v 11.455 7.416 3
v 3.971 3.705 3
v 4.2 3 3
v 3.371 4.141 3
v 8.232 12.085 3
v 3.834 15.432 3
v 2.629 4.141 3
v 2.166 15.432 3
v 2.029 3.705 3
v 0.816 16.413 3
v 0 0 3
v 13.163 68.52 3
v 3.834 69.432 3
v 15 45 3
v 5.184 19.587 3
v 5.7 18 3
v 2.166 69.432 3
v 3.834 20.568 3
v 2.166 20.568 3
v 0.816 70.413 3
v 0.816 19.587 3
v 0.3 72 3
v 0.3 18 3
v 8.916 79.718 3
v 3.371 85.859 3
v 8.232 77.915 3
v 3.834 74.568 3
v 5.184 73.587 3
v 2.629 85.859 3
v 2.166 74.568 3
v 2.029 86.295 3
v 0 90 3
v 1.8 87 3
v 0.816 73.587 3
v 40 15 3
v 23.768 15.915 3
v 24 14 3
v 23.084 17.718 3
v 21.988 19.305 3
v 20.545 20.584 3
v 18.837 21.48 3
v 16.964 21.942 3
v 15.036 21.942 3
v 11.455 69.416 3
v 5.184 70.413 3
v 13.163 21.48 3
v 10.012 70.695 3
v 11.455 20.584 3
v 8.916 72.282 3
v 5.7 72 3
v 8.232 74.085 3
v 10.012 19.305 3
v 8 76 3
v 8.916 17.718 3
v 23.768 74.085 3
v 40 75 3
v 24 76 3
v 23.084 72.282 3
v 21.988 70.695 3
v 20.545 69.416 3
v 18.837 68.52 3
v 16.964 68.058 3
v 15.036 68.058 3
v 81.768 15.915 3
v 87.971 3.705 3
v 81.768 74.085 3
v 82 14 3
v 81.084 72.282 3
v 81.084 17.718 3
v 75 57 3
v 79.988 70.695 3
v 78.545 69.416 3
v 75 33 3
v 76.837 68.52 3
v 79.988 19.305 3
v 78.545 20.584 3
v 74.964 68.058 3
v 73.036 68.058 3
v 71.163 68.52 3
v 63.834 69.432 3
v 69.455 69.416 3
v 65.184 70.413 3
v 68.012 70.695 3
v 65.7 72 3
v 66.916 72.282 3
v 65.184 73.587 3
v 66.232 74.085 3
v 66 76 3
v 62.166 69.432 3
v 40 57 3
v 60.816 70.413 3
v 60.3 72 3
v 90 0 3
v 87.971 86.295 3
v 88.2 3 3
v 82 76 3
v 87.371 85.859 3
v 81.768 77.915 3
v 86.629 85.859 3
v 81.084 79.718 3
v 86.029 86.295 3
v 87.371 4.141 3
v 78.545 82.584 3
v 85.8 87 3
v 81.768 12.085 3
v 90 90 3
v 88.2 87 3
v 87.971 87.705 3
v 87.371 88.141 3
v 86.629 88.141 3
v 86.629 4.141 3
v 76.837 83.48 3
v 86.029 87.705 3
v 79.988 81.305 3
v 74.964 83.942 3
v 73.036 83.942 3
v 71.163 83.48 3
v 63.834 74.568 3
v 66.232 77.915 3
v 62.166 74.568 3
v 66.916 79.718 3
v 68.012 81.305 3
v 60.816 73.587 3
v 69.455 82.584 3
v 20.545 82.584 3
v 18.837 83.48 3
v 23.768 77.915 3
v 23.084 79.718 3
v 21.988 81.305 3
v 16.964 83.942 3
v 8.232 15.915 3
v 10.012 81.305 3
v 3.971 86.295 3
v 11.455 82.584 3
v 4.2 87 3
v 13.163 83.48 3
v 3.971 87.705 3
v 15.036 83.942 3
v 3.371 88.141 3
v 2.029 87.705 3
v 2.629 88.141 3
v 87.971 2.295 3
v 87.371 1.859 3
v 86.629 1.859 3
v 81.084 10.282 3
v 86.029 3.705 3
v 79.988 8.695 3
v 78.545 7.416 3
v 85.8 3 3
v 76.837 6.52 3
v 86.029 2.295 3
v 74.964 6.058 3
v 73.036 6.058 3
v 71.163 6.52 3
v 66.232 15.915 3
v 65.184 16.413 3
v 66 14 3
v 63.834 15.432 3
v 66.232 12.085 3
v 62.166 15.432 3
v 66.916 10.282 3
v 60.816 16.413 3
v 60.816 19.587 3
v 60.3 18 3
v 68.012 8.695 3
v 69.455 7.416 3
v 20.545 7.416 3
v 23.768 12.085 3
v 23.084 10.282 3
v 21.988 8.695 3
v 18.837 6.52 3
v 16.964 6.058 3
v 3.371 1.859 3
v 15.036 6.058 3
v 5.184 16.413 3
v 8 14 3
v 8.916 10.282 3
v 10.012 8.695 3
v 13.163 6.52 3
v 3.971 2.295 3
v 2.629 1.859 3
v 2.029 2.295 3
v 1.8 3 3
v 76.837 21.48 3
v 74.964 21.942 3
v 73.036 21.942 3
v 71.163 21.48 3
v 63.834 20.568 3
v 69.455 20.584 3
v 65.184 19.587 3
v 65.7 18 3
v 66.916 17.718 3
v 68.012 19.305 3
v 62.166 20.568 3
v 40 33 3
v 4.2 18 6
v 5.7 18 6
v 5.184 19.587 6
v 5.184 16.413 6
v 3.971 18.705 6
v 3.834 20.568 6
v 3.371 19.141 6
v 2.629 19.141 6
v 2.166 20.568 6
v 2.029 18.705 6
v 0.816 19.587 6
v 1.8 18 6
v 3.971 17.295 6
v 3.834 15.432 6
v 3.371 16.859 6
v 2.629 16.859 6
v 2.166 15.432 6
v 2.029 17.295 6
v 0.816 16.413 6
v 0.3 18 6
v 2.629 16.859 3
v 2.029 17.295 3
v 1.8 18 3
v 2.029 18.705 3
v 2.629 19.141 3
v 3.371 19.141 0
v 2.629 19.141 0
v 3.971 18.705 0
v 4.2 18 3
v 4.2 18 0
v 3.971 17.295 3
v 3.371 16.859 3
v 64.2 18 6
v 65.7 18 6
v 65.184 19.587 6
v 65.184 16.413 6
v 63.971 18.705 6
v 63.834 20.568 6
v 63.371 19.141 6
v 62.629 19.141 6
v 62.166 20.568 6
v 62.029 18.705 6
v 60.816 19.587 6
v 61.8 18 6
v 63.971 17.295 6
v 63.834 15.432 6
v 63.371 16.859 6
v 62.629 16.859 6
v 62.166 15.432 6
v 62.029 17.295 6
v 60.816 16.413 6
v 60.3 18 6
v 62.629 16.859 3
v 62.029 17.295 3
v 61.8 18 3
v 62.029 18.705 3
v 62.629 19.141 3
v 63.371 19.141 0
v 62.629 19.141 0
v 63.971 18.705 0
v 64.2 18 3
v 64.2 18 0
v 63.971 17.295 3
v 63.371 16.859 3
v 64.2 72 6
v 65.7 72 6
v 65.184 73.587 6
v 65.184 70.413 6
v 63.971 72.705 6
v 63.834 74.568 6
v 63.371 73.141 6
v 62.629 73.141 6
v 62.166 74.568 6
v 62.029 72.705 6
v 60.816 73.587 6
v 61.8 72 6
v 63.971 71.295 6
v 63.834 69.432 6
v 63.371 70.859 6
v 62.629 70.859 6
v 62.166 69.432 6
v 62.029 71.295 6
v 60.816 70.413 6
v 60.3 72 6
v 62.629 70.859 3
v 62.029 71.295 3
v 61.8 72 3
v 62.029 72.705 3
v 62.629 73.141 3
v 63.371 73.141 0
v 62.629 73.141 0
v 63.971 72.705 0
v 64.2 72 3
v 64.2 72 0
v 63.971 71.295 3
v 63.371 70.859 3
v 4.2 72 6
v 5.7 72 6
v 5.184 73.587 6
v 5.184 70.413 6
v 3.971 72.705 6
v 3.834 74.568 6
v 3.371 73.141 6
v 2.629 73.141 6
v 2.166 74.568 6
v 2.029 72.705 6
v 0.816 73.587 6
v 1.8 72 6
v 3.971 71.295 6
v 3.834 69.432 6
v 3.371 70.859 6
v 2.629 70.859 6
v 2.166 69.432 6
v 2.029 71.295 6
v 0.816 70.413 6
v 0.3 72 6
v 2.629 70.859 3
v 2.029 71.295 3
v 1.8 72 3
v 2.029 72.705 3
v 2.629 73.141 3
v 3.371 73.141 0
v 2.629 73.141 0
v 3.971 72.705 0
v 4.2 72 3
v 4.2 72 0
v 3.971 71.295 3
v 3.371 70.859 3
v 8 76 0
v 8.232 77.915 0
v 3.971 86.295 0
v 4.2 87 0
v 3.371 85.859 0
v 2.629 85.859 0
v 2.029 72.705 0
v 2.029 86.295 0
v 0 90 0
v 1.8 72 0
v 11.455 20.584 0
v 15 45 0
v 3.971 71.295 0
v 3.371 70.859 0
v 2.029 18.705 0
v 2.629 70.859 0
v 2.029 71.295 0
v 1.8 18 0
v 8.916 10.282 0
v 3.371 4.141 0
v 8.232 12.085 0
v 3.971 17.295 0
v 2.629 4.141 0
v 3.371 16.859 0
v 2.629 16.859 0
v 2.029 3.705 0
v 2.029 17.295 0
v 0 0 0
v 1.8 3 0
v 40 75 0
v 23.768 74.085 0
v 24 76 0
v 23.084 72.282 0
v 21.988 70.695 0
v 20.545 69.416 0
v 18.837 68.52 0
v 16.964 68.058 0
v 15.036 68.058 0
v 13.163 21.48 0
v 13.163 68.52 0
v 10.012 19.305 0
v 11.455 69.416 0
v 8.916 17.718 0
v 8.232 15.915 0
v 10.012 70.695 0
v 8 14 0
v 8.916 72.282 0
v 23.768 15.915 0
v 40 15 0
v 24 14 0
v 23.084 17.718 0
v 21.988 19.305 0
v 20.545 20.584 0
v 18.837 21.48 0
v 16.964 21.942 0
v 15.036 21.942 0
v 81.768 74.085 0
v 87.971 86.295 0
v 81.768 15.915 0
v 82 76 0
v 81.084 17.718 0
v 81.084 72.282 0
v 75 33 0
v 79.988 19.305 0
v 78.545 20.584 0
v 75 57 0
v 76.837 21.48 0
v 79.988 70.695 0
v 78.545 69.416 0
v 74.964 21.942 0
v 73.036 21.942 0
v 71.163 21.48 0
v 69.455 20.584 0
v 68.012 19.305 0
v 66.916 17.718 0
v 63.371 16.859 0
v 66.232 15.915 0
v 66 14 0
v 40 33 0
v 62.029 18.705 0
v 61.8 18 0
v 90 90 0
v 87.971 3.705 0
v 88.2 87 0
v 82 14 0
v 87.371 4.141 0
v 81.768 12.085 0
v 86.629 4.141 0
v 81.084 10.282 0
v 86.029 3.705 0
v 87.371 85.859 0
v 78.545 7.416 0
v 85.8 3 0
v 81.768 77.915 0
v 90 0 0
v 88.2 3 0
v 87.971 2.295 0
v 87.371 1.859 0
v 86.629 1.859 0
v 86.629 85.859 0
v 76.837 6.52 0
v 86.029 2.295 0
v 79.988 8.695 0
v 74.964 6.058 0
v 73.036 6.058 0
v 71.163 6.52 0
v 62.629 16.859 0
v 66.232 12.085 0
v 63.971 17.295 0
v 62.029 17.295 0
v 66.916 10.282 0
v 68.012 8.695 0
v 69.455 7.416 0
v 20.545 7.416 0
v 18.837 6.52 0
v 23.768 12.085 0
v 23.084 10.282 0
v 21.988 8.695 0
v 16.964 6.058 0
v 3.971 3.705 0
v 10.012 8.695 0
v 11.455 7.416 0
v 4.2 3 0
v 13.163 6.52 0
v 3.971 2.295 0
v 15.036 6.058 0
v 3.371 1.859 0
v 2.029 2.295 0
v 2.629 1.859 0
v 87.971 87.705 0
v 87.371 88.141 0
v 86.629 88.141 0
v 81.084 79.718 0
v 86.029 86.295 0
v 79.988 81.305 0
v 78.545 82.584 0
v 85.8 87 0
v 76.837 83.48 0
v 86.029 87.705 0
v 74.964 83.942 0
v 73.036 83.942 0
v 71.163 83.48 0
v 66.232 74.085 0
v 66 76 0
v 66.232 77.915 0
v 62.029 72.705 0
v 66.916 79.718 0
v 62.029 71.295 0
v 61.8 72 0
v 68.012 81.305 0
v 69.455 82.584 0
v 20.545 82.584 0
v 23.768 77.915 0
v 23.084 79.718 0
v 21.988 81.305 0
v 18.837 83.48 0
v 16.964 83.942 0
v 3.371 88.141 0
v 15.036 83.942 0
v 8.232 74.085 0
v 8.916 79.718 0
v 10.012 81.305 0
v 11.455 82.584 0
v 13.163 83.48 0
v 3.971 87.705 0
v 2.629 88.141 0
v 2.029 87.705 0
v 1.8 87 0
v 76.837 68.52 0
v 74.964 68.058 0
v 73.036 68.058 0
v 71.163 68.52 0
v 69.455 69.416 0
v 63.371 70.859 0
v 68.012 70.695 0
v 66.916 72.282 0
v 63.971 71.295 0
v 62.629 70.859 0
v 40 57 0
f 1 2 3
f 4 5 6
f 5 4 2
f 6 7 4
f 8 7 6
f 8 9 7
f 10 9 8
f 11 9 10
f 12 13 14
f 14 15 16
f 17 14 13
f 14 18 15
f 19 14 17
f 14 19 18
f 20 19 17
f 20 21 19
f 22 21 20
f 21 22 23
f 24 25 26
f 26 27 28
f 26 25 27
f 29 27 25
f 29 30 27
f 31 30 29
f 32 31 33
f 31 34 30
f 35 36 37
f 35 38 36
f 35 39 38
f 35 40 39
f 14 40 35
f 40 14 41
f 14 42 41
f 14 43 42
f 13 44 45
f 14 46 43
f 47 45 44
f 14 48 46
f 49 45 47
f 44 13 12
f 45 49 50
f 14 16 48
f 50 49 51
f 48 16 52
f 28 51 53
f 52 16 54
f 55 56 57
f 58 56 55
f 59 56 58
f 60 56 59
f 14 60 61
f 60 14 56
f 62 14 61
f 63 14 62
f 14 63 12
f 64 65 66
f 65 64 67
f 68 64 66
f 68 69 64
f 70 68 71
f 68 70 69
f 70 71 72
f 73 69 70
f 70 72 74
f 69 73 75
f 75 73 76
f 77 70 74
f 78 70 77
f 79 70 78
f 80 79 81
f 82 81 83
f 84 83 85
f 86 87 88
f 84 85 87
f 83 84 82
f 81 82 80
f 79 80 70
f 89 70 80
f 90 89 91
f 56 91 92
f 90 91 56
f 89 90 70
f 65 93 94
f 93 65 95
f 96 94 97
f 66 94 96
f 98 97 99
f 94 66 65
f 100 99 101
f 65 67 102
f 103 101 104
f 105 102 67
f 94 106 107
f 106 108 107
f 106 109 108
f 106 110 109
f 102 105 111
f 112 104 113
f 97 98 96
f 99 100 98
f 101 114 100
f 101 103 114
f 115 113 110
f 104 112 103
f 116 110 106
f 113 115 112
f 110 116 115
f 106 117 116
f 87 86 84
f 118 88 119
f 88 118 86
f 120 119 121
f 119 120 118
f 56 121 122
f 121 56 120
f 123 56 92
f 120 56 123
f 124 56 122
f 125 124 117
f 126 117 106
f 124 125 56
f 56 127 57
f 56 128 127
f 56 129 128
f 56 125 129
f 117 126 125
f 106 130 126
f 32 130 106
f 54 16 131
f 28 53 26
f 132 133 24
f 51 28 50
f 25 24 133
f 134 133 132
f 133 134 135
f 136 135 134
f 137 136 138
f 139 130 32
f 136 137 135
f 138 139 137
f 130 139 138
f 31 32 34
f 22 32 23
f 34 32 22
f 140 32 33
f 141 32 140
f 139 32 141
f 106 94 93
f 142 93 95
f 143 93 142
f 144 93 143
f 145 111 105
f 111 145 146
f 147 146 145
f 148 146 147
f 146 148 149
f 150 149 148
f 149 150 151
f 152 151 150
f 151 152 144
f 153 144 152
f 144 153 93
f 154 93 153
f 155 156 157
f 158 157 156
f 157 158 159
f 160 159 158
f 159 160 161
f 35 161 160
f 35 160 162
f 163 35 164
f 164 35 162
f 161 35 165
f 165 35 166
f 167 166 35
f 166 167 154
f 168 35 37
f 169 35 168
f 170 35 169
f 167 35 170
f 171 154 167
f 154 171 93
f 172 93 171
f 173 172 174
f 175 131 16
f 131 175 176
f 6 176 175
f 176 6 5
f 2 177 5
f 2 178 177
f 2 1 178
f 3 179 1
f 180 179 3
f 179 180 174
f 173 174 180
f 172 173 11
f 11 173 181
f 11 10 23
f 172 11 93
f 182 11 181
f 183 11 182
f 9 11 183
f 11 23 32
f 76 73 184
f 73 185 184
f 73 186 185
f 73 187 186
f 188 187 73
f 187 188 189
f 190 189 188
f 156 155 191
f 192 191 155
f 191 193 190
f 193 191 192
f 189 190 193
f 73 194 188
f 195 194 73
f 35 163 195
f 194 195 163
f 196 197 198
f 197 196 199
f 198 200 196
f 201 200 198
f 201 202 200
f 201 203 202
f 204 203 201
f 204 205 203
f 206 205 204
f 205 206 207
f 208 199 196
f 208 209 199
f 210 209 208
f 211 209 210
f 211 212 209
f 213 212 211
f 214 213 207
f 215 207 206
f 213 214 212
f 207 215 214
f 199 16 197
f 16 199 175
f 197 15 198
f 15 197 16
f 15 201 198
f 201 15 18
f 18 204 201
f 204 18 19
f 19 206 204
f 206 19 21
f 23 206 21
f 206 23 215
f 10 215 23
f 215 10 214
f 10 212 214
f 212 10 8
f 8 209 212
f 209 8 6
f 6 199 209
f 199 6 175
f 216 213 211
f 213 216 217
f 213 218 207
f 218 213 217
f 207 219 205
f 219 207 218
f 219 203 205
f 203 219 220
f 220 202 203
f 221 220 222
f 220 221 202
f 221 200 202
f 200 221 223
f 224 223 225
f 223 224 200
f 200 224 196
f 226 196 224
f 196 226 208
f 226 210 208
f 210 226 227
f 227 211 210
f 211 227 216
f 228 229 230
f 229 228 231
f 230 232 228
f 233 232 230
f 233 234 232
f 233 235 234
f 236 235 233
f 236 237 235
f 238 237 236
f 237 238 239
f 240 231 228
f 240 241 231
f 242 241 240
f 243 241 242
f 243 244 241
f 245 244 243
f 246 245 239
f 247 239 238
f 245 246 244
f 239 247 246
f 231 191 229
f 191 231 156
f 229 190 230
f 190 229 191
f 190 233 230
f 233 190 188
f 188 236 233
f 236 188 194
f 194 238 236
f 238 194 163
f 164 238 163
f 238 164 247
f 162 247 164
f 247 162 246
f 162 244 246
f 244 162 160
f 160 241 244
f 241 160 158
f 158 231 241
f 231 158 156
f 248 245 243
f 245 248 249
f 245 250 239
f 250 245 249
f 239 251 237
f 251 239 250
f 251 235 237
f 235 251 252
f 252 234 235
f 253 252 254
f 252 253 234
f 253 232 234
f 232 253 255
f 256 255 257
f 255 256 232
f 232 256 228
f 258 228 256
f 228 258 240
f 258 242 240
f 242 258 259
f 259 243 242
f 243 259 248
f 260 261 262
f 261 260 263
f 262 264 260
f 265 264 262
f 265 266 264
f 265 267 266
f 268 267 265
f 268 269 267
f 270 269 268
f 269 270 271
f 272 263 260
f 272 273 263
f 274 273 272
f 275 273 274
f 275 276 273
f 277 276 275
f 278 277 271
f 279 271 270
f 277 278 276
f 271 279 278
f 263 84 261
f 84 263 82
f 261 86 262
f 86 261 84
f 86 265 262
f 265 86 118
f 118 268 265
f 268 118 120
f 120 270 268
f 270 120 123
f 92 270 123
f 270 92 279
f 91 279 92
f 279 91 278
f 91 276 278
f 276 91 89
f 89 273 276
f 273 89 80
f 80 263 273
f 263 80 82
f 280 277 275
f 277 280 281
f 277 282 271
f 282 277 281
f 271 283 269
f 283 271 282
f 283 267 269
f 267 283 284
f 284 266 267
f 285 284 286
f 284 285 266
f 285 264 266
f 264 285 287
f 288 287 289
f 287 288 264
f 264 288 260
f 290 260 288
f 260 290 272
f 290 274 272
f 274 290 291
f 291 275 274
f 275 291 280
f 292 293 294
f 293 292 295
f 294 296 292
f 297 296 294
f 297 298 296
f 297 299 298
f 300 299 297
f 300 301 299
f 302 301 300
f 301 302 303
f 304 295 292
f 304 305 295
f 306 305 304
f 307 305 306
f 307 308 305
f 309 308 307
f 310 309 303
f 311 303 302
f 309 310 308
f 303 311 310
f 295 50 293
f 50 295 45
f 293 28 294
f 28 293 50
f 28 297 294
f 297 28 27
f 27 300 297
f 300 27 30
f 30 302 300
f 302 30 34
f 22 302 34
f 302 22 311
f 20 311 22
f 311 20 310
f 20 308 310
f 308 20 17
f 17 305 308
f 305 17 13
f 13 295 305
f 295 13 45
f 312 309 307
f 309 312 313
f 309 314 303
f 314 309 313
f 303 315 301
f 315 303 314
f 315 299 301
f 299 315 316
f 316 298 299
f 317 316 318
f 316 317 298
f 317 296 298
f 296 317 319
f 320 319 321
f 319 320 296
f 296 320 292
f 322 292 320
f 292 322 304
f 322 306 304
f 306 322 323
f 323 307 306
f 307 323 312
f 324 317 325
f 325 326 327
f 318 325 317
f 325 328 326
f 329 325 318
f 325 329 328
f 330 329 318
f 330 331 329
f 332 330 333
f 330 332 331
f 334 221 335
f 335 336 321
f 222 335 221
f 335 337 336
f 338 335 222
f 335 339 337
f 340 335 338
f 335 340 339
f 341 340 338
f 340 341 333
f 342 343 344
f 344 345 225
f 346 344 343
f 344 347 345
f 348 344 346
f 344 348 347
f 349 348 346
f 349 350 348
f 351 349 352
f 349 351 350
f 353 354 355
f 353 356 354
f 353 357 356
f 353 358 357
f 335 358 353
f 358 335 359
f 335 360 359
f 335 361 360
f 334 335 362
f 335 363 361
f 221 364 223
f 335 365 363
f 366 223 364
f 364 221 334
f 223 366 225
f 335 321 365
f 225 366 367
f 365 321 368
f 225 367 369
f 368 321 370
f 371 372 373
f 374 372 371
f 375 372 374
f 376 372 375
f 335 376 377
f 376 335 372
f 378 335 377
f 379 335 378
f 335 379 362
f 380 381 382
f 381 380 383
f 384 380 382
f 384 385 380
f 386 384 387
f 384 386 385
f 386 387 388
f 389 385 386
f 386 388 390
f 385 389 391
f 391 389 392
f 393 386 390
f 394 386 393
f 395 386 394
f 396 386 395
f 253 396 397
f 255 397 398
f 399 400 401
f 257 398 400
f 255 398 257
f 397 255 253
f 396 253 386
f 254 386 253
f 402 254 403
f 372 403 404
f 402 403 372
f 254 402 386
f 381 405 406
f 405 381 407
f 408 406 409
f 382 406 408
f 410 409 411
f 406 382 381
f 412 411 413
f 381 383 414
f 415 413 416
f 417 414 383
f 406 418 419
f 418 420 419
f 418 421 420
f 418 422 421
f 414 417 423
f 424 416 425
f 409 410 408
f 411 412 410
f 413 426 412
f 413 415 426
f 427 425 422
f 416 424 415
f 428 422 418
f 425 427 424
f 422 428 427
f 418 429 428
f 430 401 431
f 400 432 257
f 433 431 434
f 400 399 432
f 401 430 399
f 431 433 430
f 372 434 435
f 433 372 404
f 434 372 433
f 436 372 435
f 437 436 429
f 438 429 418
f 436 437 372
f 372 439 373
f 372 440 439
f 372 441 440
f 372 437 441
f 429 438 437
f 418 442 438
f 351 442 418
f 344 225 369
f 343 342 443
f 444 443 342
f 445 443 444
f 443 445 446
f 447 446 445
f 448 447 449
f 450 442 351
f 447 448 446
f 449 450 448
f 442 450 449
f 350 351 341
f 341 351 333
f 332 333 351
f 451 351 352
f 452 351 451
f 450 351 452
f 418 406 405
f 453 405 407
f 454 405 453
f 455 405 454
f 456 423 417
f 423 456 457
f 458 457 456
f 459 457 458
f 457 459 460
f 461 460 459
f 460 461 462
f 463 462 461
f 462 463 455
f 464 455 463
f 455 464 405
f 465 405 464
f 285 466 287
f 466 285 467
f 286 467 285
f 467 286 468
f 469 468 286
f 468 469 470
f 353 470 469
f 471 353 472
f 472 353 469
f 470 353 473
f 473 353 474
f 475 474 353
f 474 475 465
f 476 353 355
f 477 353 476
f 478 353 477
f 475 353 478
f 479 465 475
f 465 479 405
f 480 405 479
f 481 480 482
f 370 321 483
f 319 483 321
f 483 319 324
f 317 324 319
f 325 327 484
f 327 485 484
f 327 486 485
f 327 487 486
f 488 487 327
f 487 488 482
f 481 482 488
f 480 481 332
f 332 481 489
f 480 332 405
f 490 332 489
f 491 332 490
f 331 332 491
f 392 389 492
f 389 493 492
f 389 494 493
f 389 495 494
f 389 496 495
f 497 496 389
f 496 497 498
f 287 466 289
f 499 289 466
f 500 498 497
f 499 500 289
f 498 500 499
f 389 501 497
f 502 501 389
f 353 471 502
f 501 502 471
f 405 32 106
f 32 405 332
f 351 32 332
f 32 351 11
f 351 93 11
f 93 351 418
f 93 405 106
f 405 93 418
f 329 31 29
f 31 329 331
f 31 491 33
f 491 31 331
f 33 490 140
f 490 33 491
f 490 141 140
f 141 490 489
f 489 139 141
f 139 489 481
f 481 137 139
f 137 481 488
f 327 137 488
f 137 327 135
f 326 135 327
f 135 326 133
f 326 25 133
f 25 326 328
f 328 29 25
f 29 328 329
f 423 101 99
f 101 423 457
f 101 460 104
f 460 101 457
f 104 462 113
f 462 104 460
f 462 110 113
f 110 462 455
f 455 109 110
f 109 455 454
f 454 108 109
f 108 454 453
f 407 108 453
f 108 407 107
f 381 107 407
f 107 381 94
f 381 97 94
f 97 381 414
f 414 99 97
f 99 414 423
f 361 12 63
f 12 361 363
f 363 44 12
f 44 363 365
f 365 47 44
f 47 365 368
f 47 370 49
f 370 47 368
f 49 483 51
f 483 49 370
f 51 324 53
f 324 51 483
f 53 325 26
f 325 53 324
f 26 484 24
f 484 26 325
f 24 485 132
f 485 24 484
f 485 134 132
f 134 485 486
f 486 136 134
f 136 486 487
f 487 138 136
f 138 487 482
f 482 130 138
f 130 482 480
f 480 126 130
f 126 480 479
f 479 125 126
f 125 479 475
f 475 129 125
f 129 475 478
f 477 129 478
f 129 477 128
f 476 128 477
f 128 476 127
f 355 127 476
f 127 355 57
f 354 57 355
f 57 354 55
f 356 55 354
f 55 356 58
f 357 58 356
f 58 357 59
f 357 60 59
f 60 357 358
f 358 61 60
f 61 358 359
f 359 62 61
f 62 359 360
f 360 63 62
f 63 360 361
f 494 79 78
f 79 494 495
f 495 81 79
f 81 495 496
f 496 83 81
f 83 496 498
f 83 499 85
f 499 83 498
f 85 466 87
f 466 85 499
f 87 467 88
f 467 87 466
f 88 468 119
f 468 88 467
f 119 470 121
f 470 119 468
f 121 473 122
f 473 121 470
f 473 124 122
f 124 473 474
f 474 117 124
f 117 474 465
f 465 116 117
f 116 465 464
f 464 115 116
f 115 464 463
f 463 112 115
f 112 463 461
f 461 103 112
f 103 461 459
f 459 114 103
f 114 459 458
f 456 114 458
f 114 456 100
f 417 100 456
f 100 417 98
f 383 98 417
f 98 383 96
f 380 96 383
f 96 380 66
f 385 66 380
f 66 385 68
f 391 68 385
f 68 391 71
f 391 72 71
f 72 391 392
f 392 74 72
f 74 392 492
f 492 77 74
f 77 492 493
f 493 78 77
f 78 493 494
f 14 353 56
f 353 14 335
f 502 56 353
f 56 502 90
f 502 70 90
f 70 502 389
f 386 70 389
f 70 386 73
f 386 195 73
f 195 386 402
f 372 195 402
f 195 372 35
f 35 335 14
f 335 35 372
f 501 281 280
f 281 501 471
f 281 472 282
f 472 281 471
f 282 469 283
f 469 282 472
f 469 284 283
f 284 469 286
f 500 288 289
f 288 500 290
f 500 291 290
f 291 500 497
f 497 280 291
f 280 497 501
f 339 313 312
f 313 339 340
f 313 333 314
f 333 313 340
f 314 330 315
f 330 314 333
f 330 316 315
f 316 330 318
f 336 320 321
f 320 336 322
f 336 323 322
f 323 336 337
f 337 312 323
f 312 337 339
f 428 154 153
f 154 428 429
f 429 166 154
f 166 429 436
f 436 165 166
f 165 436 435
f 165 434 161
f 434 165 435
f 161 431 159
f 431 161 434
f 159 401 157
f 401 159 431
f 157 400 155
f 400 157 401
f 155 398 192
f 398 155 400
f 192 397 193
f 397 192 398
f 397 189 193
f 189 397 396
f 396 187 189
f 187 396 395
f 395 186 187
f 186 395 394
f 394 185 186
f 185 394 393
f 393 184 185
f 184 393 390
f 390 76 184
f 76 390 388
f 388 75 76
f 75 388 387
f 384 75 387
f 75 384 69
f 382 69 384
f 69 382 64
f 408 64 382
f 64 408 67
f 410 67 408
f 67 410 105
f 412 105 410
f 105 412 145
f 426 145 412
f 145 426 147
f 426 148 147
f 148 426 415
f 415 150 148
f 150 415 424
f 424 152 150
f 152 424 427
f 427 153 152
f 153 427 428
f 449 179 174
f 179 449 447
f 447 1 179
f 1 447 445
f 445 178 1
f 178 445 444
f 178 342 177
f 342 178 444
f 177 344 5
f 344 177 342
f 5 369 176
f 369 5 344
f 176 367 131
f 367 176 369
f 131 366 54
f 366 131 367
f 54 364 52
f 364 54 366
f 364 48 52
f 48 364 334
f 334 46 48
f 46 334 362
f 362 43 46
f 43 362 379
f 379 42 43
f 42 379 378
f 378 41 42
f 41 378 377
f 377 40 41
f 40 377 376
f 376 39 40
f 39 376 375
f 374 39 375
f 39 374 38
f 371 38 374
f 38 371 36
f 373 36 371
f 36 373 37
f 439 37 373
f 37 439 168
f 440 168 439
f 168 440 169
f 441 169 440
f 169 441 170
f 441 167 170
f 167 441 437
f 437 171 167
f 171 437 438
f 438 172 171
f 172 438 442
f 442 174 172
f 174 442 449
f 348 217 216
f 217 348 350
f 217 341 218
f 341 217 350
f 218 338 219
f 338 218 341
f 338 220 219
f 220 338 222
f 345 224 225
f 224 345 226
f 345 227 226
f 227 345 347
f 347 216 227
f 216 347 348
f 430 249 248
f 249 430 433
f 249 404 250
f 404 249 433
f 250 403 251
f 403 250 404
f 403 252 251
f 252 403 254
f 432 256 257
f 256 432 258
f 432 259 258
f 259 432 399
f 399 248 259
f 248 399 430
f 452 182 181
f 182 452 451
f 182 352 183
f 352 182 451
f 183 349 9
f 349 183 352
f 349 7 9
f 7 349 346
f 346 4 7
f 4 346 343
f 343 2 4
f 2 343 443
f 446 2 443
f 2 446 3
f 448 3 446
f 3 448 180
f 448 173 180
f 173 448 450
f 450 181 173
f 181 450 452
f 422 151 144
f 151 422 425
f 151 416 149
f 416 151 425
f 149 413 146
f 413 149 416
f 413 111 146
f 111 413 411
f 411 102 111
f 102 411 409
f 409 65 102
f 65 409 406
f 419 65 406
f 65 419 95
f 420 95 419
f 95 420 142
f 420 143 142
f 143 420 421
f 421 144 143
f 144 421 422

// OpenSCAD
use <../../Writescad/Write.scad>

////////////////////////
// HOLES

/* This board is to be used for a Raspberry Pi 3. The base#1
 * produced a warped board, and future prints should use a
 * heated glass plate.
 */

module screw_hole(x, y, hole_r)
{
    translate([x,y,0])
        circle(hole_r, $fn=10);
}

module screw_buffer(x, y, z, hole_r)
{
    outer_r = hole_r + 1.5;
    height = 3;
    translate([x, y, z])
        linear_extrude(0, 0, height)
            difference()
            {
                circle(outer_r, $fn=10);
                circle(hole_r, $fn=10);
            }
}

module all_screw_holes(hole_r)
{
    //Pi Board holes
    screw_hole(3, 18, hole_r);
    screw_hole(63, 18, hole_r);
    screw_hole(63, 72, hole_r);
    screw_hole(3, 72, hole_r);
    //leg holes
    screw_hole(3, 3, hole_r);
    screw_hole(3, 87, hole_r);
    screw_hole(87, 87, hole_r);
    screw_hole(87, 3, hole_r);
}
// Note - lots of duplication between these two, try and clean this up module
module all_screw_buffers(z, hole_r)
{
    //Pi Board buffers
    screw_buffer(3, 18, z, hole_r);
    screw_buffer(63, 18, z, hole_r);
    screw_buffer(63, 72, z, hole_r);
    screw_buffer(3, 72, z, hole_r);
}

module wire_holes(base_width)
{
    translate([16, base_width-14, 0])
        circle(r=8);
    translate([base_width-16, base_width-14, 0])
        circle(r=8);
    translate([base_width-16, 14, 0])
        circle(r=8);
    translate([16, 14, 0])
        circle(r=8);
}

////////////////////////
// BASE

module arrow()
{
    triangle_shape = [
        [0, 0],
        [25, 30],
        [25, 12],
        [60, 12],
        [60, 0]
    ];
    mirror([0, 90])
        polygon(points=triangle_shape);
    polygon(points=triangle_shape);
}

module base(base_width, base_thickness, arrow_pos)
{
    difference()
    {
        difference()
        {
            square(base_width);
            translate(arrow_pos)
                arrow(arrow_pos);
        }
        wire_holes(base_width);
    }
}

module text(base_width, z)
{
    translate([5, base_width-9, z])
        write("0");
    translate([base_width-8, base_width-9, z])
        write("1");
    translate([base_width-8, 5, z])
        write("2");
    translate([5, 5, z])
        write("3");
}

////////////////////////
// GLOBALS

base_thickness = 3;
base_width = 90;
arrow_pos = [15, 45];
hole_r = 1.2;

////////////////////////
// RENDERS

all_screw_buffers(base_thickness, hole_r);
linear_extrude(0, 0, base_thickness)
    difference()
    {
        difference()
        {
            base(base_width, base_thickness, arrow_pos);
        }
        all_screw_holes(hole_r);
    }
text(base_width, base_thickness);
